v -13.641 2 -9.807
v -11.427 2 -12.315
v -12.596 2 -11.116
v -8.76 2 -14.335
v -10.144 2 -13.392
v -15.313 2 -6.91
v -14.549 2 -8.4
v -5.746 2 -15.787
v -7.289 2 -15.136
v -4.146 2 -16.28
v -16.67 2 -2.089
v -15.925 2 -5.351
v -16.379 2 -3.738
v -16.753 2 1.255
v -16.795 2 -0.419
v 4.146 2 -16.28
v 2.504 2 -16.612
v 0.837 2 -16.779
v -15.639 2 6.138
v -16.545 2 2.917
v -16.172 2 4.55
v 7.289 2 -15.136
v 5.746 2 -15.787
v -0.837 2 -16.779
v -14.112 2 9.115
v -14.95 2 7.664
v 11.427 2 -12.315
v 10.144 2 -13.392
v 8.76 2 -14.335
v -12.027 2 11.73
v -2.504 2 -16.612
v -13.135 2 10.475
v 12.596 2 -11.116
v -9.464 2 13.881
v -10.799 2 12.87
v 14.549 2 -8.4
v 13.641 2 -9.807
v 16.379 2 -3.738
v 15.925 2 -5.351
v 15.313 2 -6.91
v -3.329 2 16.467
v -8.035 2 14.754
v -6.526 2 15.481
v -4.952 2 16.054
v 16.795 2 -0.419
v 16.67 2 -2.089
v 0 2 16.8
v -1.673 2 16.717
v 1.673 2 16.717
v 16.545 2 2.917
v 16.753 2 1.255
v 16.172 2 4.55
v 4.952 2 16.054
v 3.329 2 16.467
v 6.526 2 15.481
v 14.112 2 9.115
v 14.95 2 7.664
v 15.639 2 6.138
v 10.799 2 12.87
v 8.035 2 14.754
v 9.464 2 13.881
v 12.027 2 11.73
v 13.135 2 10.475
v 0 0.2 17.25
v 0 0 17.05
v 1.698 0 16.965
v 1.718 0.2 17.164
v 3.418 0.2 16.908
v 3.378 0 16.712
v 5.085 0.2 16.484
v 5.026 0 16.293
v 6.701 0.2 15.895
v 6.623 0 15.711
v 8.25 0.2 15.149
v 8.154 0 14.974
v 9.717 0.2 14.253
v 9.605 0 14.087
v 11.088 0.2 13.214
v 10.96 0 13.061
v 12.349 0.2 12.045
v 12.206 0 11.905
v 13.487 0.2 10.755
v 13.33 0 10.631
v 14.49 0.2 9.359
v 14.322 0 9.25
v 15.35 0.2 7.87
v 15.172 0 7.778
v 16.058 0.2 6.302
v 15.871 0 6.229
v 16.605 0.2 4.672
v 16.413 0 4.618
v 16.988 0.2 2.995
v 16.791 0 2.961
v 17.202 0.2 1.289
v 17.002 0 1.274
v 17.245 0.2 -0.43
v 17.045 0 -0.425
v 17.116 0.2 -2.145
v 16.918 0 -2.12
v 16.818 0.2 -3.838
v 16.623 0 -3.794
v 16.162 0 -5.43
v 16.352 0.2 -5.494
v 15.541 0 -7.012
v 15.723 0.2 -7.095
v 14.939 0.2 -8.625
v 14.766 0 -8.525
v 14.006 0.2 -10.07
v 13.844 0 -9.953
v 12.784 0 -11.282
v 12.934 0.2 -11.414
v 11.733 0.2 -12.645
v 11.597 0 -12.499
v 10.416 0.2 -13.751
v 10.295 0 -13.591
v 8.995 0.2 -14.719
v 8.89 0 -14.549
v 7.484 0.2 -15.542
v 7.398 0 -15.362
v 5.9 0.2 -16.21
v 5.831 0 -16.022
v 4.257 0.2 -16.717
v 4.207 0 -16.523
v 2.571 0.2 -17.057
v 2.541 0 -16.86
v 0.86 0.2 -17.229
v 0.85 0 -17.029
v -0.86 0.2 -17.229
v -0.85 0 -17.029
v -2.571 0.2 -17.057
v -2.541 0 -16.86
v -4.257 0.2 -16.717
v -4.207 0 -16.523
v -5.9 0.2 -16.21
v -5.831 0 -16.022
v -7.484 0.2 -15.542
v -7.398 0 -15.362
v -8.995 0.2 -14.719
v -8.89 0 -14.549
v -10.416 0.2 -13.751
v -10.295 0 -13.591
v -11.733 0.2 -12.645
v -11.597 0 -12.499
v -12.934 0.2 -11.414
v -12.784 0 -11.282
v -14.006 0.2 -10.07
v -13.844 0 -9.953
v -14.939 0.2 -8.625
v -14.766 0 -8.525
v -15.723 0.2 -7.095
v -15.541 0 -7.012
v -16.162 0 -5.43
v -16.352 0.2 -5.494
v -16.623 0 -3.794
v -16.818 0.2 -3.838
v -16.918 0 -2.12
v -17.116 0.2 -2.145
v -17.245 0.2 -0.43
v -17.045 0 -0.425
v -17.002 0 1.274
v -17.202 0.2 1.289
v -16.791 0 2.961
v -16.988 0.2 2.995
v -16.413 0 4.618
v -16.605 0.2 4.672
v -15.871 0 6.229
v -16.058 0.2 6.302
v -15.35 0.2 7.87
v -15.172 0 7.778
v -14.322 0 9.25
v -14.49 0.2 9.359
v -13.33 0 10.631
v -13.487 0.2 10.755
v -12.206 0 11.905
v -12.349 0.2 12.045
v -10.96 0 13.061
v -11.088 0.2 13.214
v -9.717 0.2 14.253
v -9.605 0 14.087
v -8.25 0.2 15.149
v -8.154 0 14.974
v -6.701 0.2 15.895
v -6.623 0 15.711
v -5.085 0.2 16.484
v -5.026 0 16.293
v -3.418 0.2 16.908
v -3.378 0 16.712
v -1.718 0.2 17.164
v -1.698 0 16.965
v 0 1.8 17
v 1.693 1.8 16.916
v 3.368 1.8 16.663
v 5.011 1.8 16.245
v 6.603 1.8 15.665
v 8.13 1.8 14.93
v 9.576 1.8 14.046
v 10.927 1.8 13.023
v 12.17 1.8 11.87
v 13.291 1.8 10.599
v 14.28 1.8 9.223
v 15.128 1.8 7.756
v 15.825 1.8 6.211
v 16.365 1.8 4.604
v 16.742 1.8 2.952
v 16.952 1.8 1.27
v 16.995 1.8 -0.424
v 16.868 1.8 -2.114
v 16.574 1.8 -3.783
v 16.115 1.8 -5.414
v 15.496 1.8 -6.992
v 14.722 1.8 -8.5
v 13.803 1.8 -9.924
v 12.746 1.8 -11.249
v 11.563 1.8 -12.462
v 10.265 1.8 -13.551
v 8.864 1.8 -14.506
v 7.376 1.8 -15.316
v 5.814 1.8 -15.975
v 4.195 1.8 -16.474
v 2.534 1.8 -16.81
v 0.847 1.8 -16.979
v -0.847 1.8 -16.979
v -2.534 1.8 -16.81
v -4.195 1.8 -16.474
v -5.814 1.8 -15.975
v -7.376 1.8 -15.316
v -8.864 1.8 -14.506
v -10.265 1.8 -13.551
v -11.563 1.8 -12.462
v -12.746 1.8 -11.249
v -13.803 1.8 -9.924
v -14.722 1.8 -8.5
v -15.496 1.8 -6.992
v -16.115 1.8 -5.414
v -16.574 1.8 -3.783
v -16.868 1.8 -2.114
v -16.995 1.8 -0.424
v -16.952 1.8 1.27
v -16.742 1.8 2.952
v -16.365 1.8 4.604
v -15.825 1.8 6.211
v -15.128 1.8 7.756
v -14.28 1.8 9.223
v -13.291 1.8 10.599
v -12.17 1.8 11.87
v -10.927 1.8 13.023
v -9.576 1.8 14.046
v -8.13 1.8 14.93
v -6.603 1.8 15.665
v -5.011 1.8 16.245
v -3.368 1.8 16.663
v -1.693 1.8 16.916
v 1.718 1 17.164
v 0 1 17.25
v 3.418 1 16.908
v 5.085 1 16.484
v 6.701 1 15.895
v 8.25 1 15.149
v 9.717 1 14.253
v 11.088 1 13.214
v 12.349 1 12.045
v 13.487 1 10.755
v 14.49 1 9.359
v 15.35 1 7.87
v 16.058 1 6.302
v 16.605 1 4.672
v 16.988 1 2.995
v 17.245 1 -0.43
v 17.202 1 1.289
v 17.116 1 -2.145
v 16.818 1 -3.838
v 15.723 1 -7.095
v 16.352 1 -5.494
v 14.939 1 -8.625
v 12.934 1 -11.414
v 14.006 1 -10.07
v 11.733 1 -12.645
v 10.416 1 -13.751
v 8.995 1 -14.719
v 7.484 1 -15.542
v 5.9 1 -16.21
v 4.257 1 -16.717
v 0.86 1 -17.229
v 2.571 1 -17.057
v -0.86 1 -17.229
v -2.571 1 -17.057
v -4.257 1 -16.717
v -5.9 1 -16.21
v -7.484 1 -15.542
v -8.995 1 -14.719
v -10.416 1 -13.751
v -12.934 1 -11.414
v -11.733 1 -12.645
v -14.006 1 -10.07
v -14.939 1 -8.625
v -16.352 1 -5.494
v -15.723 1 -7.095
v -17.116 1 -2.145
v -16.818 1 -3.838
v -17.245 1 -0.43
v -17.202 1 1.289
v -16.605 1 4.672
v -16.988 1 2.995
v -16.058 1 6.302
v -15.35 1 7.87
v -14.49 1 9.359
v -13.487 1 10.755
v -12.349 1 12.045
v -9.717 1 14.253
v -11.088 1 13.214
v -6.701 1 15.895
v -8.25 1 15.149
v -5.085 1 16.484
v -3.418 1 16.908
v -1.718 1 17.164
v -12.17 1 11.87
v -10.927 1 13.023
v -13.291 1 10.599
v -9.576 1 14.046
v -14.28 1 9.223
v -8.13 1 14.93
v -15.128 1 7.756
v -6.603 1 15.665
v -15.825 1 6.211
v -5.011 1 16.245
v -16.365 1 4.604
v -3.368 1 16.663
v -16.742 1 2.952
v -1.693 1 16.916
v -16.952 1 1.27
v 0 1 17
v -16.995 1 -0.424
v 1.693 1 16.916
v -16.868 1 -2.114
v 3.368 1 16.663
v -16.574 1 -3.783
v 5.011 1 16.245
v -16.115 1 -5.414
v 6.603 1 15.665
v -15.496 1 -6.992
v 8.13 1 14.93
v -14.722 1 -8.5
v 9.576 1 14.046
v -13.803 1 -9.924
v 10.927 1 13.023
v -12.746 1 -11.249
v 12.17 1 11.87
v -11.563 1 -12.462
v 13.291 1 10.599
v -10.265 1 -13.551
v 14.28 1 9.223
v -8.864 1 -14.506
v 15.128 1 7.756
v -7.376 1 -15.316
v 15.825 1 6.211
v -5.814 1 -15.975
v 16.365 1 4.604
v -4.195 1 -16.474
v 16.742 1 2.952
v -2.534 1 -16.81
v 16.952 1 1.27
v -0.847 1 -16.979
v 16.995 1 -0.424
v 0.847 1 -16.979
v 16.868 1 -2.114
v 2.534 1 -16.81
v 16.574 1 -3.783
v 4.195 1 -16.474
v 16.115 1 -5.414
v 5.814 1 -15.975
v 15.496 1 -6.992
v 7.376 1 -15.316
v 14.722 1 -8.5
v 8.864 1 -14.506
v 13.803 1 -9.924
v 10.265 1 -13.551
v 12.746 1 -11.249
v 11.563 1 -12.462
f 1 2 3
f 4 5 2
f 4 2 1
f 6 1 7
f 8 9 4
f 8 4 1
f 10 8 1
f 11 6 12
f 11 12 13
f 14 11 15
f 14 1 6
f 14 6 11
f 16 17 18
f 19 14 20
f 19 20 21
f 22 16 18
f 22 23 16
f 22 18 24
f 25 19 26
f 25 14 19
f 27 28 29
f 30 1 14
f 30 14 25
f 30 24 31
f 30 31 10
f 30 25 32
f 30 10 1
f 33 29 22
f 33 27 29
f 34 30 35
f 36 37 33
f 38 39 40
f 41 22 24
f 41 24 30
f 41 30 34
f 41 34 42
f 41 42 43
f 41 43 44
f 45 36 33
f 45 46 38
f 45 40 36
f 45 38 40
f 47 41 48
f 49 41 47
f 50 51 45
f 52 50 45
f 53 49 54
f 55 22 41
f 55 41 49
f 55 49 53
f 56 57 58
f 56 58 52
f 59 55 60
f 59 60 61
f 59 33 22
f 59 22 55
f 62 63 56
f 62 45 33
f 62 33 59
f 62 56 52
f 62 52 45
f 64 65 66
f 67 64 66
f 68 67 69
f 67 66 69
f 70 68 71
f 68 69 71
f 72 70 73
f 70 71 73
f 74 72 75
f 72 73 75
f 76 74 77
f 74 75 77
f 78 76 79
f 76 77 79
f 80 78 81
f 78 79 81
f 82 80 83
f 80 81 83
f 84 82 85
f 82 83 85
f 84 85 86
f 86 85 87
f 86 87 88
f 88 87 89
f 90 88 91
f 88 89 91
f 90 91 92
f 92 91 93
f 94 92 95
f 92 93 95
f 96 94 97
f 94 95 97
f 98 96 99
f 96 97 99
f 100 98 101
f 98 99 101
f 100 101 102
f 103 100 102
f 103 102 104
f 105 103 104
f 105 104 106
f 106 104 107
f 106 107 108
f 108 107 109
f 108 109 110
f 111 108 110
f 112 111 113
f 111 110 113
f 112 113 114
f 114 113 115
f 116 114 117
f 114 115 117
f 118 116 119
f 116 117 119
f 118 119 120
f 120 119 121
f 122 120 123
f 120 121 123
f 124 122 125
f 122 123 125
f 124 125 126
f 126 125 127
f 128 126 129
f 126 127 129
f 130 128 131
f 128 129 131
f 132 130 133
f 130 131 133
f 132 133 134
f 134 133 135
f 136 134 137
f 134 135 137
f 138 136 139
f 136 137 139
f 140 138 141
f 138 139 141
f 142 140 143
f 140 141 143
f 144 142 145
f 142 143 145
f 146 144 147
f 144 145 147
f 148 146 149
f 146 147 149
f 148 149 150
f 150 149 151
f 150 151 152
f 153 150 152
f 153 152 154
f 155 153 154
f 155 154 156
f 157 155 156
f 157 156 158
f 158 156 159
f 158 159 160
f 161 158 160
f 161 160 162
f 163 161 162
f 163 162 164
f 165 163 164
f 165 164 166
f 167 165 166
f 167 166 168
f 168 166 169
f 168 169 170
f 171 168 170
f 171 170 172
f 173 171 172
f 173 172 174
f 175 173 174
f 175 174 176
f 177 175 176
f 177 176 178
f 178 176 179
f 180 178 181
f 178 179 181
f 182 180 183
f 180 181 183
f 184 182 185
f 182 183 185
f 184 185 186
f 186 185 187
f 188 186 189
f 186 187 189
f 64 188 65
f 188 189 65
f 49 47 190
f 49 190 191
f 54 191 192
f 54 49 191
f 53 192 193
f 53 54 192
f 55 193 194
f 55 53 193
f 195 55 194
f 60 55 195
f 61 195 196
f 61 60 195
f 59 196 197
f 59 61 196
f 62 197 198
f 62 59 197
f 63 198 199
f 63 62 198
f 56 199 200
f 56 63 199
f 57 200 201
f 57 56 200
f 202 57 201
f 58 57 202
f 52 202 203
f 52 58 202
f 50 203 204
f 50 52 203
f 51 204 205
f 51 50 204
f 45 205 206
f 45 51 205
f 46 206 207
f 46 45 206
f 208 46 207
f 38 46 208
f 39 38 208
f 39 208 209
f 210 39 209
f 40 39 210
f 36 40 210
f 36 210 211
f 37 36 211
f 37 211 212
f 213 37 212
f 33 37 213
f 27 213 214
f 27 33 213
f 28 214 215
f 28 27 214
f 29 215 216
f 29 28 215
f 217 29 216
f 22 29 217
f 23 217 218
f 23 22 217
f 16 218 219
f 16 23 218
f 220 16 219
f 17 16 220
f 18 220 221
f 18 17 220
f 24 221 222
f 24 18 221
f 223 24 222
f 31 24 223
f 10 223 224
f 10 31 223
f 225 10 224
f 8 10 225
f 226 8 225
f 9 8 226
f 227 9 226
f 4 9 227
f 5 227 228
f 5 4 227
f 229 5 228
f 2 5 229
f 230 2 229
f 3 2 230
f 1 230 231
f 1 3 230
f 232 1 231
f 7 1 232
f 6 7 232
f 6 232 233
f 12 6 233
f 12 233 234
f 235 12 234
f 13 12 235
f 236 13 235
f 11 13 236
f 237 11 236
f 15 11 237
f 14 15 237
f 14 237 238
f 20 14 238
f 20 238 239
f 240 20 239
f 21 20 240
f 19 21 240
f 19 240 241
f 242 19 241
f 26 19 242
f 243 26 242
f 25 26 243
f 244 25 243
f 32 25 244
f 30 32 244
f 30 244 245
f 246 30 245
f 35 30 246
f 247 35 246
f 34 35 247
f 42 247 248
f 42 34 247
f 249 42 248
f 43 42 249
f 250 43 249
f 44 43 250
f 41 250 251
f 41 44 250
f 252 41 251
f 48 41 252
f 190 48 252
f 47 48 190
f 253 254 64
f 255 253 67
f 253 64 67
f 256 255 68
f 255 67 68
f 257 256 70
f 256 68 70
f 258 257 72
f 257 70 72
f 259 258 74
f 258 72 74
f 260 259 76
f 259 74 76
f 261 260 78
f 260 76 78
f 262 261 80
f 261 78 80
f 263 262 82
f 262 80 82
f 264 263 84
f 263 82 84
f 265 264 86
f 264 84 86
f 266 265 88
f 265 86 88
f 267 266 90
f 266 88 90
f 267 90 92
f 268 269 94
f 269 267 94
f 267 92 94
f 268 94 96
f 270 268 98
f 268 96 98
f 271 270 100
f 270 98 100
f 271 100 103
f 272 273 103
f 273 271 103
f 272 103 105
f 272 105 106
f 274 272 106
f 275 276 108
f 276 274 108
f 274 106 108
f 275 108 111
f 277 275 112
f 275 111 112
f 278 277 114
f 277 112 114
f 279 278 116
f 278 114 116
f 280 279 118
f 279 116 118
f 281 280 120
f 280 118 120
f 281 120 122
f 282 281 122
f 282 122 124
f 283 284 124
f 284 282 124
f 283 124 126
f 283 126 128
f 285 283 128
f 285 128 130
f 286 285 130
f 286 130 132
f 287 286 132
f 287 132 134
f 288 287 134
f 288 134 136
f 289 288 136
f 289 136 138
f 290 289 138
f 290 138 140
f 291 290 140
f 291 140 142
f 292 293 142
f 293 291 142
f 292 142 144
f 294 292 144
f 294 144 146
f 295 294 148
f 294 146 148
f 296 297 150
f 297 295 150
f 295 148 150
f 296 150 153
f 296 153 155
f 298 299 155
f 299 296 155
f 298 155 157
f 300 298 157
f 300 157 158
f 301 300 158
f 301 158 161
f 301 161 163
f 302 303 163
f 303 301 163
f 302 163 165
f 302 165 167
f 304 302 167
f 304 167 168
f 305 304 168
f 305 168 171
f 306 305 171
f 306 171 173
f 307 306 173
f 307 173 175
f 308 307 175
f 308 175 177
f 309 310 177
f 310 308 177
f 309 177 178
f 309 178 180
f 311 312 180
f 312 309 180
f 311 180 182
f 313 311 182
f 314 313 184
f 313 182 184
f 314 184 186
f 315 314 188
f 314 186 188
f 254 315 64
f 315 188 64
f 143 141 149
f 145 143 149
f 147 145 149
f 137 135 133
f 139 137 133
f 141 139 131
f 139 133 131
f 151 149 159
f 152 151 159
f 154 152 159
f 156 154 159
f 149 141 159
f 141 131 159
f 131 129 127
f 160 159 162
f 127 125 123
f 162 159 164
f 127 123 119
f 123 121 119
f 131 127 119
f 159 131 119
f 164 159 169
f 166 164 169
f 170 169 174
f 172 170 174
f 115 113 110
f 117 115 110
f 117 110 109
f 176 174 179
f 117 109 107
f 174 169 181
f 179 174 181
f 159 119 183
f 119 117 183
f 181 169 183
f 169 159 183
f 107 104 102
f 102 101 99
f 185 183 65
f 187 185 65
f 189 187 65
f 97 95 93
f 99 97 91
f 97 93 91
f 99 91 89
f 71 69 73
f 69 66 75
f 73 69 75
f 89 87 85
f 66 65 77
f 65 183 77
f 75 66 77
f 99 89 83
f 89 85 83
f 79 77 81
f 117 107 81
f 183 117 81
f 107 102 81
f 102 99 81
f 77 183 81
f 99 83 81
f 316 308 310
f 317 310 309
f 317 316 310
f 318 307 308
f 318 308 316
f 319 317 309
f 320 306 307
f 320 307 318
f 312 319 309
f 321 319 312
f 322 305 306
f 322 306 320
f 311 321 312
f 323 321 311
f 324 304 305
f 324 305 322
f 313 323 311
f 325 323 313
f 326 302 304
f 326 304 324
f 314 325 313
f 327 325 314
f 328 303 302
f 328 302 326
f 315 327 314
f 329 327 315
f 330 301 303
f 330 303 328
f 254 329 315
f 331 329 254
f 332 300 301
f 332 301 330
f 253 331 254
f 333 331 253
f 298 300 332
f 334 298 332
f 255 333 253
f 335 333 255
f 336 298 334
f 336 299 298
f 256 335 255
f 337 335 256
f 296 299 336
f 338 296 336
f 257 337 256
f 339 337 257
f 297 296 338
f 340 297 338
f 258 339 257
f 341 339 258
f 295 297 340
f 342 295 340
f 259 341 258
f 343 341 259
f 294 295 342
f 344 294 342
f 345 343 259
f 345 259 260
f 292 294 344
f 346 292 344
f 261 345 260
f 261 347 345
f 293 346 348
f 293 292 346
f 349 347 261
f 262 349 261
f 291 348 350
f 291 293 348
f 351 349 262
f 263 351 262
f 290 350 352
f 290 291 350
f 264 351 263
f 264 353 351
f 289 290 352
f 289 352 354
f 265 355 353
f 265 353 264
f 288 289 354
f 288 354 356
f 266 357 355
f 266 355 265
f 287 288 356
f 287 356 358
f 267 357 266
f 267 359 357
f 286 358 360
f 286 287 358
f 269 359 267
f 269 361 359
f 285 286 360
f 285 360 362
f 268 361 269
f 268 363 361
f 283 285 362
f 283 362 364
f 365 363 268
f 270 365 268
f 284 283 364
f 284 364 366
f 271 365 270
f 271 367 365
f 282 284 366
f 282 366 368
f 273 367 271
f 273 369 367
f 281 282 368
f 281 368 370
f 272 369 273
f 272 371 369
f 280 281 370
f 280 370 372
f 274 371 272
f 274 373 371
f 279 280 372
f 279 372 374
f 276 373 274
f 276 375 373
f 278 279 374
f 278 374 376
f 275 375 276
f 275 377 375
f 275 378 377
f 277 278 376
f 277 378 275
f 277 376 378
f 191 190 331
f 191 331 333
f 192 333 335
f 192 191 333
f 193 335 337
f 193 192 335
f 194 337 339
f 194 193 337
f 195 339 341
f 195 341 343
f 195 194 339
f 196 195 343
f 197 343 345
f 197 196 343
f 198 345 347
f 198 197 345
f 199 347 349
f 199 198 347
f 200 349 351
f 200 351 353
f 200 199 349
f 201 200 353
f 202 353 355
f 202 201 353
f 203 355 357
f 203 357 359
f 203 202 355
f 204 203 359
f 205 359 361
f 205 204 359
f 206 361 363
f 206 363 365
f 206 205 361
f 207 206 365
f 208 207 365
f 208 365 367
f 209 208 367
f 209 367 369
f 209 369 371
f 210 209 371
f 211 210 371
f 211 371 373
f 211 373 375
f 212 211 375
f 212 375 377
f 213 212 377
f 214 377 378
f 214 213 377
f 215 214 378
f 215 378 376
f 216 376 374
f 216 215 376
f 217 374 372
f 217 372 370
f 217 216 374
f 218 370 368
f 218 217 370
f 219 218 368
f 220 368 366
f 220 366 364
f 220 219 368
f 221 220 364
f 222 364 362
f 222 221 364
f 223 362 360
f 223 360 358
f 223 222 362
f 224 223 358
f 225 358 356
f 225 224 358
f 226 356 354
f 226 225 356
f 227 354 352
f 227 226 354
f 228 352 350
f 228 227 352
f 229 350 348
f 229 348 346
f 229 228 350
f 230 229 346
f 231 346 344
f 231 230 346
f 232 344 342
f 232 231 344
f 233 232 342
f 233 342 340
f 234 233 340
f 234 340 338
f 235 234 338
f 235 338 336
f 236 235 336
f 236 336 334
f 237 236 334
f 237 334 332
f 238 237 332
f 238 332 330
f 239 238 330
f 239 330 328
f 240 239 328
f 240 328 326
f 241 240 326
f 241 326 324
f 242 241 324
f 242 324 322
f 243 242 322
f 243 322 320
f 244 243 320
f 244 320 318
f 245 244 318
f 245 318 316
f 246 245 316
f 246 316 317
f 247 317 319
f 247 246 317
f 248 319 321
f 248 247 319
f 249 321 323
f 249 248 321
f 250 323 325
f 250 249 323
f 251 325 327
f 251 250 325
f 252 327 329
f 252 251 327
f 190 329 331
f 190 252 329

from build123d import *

# Parameters (mm, degrees)
SKETCH1_R           = 17.25
BOSS_EXTRUDE1_DEPTH = 2
SKETCH2_OUTSIDE_W   = 46.266
SKETCH2_OUTSIDE_H   = 46.266
SKETCH2_OUTSIDE_R   = 17
CUT_EXTRUDE1_DEPTH  = 1
CHAMFER1_SIZE       = 0.2


with BuildPart() as part:
    # Sketch1 → Boss-Extrude1 (new body)
    with BuildSketch(Plane(origin=(0, 0, 0), x_dir=(1, 0, 0), z_dir=(0, 1, 0))):
        with Locations(Location((0, 0, 0), (0, 0, 270))):
            Circle(SKETCH1_R)
    extrude(amount=BOSS_EXTRUDE1_DEPTH)

    # Sketch2 outside → Cut-Extrude1 (cut)
    with BuildSketch(Plane(origin=(0, 2, 0), x_dir=(1, 0, 0), z_dir=(0, 1, 0))):
        Rectangle(SKETCH2_OUTSIDE_W, SKETCH2_OUTSIDE_H)
        with Locations(Location((0, 0, 0), (0, 0, 270))):
            Circle(SKETCH2_OUTSIDE_R, mode=Mode.SUBTRACT)
    extrude(amount=-CUT_EXTRUDE1_DEPTH, mode=Mode.SUBTRACT)

    # Chamfer1
    chamfer1_edges = [part.edges().sort_by_distance(p)[0] for p in [
        (0, 2, -17),
        (0, 0, -17.25),
    ]]
    chamfer(chamfer1_edges, length=CHAMFER1_SIZE)


solid = part.part
